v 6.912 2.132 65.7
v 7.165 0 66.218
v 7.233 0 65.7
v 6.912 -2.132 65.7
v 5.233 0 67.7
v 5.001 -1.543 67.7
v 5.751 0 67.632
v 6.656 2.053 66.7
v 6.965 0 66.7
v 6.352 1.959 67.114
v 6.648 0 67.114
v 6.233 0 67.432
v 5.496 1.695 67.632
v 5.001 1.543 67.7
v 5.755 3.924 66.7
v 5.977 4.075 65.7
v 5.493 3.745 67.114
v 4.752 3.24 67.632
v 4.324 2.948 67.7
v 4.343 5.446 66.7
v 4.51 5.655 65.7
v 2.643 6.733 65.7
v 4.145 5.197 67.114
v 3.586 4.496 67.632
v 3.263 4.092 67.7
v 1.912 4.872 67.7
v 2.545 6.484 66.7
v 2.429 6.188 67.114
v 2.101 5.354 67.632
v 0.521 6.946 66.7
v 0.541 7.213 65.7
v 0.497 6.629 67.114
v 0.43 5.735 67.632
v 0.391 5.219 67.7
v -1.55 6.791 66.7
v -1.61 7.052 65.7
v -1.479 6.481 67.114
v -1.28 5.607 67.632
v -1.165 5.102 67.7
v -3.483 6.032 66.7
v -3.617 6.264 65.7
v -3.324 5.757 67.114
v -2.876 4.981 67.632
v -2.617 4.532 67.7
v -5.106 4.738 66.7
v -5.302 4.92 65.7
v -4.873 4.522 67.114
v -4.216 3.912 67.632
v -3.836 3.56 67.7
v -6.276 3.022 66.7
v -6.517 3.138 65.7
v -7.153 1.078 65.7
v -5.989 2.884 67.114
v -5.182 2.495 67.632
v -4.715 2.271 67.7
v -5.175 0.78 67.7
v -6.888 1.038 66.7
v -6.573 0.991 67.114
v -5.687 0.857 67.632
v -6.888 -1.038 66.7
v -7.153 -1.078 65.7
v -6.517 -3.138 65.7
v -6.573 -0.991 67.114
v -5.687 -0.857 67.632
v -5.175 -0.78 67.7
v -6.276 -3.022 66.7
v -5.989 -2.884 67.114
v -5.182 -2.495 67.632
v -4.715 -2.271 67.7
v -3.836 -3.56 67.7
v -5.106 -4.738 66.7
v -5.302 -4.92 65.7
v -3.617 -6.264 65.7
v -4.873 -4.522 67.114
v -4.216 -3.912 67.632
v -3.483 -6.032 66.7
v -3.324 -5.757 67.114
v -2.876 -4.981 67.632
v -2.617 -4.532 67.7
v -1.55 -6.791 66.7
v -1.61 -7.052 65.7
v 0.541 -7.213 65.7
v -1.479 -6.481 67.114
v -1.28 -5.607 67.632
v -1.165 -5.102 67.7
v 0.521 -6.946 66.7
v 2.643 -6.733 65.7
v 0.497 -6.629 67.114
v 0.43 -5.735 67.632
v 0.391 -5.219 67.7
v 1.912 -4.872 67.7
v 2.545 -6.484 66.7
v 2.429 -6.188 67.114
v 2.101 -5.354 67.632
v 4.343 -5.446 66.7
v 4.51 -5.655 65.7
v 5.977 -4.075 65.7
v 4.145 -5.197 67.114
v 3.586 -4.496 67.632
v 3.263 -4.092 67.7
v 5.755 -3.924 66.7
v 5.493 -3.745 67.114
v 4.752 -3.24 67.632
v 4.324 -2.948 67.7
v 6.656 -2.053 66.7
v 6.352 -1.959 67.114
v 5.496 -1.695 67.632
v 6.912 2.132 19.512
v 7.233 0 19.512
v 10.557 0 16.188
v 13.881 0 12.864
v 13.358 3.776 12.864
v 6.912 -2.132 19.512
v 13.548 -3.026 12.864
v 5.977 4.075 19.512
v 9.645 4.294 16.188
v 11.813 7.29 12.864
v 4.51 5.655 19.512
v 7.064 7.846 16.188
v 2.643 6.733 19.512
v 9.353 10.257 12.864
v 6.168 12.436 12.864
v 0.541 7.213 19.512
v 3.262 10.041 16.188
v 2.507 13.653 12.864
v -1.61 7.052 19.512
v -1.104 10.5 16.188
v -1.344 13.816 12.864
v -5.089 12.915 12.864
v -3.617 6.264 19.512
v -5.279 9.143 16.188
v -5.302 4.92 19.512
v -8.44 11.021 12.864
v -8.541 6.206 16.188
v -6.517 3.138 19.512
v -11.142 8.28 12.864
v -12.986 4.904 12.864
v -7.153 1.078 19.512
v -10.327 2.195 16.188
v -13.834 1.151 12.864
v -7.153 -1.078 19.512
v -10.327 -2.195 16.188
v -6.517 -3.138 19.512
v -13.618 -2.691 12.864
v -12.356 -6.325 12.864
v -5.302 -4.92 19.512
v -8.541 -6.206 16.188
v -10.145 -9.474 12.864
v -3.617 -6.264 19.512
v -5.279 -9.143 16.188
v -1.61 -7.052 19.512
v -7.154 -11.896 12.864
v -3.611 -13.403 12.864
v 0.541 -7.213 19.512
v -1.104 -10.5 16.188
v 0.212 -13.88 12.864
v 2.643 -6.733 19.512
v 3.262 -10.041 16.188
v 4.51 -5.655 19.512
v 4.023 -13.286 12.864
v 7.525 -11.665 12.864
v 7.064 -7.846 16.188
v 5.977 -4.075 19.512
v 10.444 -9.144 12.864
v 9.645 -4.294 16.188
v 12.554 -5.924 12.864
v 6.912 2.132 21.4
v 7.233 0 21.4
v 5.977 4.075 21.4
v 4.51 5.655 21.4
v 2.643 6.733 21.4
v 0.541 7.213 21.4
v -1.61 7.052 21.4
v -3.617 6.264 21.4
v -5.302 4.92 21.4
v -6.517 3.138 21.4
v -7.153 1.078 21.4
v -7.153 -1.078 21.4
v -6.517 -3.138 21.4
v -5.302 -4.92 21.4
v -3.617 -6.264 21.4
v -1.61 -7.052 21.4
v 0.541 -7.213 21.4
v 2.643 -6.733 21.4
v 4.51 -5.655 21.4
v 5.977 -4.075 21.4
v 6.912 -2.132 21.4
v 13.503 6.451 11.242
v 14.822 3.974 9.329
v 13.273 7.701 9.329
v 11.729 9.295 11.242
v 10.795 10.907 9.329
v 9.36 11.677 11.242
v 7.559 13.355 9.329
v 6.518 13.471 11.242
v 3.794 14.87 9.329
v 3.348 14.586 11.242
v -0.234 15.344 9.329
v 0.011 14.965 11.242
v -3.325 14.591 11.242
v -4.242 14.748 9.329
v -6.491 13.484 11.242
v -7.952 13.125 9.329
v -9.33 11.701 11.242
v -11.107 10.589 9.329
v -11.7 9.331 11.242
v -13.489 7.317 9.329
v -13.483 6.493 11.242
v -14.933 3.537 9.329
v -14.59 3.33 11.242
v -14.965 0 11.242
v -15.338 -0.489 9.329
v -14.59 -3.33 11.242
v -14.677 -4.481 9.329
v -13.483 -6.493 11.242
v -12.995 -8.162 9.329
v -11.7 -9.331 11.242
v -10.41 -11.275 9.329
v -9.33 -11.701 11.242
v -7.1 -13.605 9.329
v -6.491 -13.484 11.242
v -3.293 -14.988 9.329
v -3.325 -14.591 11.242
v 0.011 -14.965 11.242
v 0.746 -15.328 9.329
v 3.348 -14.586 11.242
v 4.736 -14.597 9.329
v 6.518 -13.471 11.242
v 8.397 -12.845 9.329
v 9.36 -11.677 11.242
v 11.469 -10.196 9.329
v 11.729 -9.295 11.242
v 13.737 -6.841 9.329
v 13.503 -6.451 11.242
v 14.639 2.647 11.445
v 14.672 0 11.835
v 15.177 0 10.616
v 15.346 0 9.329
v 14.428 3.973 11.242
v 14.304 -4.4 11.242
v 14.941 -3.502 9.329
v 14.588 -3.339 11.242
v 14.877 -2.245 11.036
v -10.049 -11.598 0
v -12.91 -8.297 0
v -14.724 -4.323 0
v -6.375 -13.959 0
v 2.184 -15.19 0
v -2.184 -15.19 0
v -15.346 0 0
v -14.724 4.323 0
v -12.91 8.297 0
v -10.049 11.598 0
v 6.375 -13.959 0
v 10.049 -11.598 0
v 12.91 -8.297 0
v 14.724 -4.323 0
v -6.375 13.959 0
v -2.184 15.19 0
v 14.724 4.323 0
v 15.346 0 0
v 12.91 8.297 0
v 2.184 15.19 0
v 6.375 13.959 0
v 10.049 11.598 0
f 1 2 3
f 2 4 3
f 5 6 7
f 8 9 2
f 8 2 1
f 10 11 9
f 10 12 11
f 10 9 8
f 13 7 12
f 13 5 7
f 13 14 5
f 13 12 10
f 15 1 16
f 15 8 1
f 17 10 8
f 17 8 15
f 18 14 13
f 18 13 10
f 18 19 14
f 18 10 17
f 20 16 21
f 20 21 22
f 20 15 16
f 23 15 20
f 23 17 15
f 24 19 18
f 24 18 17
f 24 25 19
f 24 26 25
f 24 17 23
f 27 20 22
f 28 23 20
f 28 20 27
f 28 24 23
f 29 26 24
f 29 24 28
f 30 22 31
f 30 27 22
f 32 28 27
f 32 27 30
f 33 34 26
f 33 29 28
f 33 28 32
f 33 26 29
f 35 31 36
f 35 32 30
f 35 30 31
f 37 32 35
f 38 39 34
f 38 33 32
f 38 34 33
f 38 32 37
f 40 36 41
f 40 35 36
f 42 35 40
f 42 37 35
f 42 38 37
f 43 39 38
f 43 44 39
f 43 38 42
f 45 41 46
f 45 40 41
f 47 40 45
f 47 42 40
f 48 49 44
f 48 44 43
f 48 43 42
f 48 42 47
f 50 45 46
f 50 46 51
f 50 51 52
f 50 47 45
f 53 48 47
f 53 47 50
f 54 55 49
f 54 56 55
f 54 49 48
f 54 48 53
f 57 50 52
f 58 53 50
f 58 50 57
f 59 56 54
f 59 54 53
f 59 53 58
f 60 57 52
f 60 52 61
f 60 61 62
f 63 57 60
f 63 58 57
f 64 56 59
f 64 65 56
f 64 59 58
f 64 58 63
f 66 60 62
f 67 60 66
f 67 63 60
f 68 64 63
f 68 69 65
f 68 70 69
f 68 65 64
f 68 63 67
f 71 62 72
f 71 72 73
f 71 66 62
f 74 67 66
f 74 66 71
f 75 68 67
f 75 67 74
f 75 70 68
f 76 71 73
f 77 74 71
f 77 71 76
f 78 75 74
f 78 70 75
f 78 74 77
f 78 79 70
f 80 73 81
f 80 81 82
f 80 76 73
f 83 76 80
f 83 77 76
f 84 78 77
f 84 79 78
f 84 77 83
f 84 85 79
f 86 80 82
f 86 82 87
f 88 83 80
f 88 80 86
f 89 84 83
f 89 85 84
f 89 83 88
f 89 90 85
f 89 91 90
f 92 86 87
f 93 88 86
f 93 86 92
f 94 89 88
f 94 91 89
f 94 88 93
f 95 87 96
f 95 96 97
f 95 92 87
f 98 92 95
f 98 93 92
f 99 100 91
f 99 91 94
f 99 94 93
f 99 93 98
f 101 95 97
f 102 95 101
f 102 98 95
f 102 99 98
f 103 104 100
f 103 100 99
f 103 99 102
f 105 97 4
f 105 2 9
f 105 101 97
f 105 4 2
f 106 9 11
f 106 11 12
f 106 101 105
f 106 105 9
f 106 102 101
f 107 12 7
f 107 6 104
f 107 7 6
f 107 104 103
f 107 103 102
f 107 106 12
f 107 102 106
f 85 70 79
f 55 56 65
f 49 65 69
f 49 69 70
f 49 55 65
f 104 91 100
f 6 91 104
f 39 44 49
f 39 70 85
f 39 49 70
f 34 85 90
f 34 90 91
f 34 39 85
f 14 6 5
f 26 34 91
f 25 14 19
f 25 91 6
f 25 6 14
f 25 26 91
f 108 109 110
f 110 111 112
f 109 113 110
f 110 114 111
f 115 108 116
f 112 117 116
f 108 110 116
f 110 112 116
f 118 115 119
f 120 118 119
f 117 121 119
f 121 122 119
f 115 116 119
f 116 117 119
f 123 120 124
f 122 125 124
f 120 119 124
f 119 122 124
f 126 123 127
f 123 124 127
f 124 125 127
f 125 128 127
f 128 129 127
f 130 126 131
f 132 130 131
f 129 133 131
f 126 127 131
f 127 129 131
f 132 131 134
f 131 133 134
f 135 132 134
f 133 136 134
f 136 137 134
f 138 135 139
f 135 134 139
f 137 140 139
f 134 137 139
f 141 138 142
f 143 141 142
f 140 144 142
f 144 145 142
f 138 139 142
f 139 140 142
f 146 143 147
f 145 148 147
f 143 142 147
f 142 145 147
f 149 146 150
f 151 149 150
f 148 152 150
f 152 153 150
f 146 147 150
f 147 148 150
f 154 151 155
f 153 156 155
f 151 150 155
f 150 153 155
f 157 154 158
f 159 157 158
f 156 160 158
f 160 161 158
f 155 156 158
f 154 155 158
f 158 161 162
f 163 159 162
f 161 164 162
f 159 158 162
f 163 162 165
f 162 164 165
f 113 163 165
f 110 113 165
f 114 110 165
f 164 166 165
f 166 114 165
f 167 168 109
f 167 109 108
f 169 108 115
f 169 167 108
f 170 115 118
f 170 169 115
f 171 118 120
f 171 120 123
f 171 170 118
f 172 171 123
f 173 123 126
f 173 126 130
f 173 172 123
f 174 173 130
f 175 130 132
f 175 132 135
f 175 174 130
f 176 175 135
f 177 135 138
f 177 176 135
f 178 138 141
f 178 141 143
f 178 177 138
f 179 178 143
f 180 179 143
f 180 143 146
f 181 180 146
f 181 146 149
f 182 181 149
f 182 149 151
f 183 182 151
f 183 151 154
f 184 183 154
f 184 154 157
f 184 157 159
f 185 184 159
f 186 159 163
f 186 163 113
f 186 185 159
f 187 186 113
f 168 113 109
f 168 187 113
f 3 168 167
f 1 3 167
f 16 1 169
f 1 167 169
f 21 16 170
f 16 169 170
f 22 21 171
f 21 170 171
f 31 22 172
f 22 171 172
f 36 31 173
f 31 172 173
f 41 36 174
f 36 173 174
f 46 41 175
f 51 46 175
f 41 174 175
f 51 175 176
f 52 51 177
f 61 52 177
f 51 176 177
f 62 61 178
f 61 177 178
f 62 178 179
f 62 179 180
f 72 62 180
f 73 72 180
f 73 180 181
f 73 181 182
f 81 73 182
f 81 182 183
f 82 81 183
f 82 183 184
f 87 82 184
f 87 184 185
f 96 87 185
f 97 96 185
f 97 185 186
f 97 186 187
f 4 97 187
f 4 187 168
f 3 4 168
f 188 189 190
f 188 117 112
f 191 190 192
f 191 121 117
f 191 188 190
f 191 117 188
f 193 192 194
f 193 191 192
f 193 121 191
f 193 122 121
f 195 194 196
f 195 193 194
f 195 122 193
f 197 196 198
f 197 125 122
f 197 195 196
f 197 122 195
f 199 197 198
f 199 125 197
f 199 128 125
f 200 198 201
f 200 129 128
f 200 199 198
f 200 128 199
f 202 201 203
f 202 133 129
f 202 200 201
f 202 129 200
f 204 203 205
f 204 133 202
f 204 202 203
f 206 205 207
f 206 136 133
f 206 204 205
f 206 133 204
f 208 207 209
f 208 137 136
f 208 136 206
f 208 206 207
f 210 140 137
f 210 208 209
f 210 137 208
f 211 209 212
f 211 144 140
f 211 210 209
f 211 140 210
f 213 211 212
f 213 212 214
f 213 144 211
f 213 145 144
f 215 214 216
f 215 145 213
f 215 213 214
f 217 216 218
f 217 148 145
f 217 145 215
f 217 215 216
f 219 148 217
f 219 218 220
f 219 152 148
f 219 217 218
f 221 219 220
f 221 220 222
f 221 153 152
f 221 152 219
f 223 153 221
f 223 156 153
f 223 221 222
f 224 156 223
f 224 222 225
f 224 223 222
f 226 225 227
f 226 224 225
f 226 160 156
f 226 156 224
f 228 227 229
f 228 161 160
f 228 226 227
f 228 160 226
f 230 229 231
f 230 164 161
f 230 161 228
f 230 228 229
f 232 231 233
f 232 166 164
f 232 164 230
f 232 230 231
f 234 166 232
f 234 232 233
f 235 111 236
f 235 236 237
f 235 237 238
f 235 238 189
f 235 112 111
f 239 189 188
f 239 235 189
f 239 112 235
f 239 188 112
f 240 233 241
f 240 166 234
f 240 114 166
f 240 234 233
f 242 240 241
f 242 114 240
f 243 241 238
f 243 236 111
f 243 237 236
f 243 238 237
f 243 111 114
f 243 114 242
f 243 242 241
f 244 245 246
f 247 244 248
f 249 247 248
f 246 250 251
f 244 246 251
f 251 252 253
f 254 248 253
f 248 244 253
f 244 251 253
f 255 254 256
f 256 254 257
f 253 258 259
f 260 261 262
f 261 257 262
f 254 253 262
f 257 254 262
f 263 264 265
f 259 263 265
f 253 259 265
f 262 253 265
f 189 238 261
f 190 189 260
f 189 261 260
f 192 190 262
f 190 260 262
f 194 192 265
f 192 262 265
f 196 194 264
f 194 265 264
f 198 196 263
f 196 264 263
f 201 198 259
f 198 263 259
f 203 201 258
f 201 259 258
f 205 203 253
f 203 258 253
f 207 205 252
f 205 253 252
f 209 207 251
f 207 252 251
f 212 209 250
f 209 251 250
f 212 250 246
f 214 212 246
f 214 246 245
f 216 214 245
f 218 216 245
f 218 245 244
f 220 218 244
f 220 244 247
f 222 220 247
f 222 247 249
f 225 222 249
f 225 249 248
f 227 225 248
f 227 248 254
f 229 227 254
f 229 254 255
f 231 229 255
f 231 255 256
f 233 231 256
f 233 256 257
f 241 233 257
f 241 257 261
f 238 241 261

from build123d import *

# Parameters (mm, degrees)
F0_R        = 7.2334484139
F1_DEPTH    = 67.7
F2_R        = 15.3458789883
F3_DEPTH    = 21.4
F4_R        = 2
F5_S5_R     = 7.2334484139
F5_T6_DEPTH = 24
F6_R        = 5


# Not quite as in the source:
# - a fillet or chamfer that OpenCascade refuses, or shapes differently, is made with other operations: its cross-section is extruded or revolved along the edge and cut away or added


with BuildPart() as f1:
    # F0 (on Top) → F1 (new body)
    with BuildSketch(Plane.XY):
        Circle(F0_R)
    extrude(amount=F1_DEPTH)

    # F2 (on Top) → F3 (join)
    with BuildSketch(Plane.XY):
        Circle(F2_R)
    extrude(amount=F3_DEPTH)

    # F4
    f4_edges = [f1.edges().sort_by_distance(p)[0] for p in [
        (-7.233448, 0, 67.7),
    ]]
    fillet(f4_edges, radius=F4_R)

    # F5: chamfer of 10 on 1 edges, made by hand


with BuildPart() as f5_tool2:
    # F5_s3 → F5_t4 (revolve)
    with BuildSketch(Plane.XZ):
        Polygon((5.3458789883, 21.4), (15.3458789883, 11.4), (15.3458789883, 21.4), align=None)
    revolve(axis=Axis((0, 0, 21.4), (0, 0, 1)))

    # F5_s5 → F5_t6 (cut, symmetric)
    with BuildSketch(Plane.XY.offset(16.4)):
        Circle(F5_S5_R)
    extrude(amount=F5_T6_DEPTH, both=True, mode=Mode.SUBTRACT)


with BuildPart() as f1_1:
    add(f1.part)

    # F5_t1: cut F5_tool2
    add(f5_tool2.part, mode=Mode.SUBTRACT)

    # F6
    f6_edges = [f1_1.edges().sort_by_distance(p)[0] for p in [
        (-15.345879, 0, 11.4),
    ]]
    fillet(f6_edges, radius=F6_R)


solid = f1_1.part
